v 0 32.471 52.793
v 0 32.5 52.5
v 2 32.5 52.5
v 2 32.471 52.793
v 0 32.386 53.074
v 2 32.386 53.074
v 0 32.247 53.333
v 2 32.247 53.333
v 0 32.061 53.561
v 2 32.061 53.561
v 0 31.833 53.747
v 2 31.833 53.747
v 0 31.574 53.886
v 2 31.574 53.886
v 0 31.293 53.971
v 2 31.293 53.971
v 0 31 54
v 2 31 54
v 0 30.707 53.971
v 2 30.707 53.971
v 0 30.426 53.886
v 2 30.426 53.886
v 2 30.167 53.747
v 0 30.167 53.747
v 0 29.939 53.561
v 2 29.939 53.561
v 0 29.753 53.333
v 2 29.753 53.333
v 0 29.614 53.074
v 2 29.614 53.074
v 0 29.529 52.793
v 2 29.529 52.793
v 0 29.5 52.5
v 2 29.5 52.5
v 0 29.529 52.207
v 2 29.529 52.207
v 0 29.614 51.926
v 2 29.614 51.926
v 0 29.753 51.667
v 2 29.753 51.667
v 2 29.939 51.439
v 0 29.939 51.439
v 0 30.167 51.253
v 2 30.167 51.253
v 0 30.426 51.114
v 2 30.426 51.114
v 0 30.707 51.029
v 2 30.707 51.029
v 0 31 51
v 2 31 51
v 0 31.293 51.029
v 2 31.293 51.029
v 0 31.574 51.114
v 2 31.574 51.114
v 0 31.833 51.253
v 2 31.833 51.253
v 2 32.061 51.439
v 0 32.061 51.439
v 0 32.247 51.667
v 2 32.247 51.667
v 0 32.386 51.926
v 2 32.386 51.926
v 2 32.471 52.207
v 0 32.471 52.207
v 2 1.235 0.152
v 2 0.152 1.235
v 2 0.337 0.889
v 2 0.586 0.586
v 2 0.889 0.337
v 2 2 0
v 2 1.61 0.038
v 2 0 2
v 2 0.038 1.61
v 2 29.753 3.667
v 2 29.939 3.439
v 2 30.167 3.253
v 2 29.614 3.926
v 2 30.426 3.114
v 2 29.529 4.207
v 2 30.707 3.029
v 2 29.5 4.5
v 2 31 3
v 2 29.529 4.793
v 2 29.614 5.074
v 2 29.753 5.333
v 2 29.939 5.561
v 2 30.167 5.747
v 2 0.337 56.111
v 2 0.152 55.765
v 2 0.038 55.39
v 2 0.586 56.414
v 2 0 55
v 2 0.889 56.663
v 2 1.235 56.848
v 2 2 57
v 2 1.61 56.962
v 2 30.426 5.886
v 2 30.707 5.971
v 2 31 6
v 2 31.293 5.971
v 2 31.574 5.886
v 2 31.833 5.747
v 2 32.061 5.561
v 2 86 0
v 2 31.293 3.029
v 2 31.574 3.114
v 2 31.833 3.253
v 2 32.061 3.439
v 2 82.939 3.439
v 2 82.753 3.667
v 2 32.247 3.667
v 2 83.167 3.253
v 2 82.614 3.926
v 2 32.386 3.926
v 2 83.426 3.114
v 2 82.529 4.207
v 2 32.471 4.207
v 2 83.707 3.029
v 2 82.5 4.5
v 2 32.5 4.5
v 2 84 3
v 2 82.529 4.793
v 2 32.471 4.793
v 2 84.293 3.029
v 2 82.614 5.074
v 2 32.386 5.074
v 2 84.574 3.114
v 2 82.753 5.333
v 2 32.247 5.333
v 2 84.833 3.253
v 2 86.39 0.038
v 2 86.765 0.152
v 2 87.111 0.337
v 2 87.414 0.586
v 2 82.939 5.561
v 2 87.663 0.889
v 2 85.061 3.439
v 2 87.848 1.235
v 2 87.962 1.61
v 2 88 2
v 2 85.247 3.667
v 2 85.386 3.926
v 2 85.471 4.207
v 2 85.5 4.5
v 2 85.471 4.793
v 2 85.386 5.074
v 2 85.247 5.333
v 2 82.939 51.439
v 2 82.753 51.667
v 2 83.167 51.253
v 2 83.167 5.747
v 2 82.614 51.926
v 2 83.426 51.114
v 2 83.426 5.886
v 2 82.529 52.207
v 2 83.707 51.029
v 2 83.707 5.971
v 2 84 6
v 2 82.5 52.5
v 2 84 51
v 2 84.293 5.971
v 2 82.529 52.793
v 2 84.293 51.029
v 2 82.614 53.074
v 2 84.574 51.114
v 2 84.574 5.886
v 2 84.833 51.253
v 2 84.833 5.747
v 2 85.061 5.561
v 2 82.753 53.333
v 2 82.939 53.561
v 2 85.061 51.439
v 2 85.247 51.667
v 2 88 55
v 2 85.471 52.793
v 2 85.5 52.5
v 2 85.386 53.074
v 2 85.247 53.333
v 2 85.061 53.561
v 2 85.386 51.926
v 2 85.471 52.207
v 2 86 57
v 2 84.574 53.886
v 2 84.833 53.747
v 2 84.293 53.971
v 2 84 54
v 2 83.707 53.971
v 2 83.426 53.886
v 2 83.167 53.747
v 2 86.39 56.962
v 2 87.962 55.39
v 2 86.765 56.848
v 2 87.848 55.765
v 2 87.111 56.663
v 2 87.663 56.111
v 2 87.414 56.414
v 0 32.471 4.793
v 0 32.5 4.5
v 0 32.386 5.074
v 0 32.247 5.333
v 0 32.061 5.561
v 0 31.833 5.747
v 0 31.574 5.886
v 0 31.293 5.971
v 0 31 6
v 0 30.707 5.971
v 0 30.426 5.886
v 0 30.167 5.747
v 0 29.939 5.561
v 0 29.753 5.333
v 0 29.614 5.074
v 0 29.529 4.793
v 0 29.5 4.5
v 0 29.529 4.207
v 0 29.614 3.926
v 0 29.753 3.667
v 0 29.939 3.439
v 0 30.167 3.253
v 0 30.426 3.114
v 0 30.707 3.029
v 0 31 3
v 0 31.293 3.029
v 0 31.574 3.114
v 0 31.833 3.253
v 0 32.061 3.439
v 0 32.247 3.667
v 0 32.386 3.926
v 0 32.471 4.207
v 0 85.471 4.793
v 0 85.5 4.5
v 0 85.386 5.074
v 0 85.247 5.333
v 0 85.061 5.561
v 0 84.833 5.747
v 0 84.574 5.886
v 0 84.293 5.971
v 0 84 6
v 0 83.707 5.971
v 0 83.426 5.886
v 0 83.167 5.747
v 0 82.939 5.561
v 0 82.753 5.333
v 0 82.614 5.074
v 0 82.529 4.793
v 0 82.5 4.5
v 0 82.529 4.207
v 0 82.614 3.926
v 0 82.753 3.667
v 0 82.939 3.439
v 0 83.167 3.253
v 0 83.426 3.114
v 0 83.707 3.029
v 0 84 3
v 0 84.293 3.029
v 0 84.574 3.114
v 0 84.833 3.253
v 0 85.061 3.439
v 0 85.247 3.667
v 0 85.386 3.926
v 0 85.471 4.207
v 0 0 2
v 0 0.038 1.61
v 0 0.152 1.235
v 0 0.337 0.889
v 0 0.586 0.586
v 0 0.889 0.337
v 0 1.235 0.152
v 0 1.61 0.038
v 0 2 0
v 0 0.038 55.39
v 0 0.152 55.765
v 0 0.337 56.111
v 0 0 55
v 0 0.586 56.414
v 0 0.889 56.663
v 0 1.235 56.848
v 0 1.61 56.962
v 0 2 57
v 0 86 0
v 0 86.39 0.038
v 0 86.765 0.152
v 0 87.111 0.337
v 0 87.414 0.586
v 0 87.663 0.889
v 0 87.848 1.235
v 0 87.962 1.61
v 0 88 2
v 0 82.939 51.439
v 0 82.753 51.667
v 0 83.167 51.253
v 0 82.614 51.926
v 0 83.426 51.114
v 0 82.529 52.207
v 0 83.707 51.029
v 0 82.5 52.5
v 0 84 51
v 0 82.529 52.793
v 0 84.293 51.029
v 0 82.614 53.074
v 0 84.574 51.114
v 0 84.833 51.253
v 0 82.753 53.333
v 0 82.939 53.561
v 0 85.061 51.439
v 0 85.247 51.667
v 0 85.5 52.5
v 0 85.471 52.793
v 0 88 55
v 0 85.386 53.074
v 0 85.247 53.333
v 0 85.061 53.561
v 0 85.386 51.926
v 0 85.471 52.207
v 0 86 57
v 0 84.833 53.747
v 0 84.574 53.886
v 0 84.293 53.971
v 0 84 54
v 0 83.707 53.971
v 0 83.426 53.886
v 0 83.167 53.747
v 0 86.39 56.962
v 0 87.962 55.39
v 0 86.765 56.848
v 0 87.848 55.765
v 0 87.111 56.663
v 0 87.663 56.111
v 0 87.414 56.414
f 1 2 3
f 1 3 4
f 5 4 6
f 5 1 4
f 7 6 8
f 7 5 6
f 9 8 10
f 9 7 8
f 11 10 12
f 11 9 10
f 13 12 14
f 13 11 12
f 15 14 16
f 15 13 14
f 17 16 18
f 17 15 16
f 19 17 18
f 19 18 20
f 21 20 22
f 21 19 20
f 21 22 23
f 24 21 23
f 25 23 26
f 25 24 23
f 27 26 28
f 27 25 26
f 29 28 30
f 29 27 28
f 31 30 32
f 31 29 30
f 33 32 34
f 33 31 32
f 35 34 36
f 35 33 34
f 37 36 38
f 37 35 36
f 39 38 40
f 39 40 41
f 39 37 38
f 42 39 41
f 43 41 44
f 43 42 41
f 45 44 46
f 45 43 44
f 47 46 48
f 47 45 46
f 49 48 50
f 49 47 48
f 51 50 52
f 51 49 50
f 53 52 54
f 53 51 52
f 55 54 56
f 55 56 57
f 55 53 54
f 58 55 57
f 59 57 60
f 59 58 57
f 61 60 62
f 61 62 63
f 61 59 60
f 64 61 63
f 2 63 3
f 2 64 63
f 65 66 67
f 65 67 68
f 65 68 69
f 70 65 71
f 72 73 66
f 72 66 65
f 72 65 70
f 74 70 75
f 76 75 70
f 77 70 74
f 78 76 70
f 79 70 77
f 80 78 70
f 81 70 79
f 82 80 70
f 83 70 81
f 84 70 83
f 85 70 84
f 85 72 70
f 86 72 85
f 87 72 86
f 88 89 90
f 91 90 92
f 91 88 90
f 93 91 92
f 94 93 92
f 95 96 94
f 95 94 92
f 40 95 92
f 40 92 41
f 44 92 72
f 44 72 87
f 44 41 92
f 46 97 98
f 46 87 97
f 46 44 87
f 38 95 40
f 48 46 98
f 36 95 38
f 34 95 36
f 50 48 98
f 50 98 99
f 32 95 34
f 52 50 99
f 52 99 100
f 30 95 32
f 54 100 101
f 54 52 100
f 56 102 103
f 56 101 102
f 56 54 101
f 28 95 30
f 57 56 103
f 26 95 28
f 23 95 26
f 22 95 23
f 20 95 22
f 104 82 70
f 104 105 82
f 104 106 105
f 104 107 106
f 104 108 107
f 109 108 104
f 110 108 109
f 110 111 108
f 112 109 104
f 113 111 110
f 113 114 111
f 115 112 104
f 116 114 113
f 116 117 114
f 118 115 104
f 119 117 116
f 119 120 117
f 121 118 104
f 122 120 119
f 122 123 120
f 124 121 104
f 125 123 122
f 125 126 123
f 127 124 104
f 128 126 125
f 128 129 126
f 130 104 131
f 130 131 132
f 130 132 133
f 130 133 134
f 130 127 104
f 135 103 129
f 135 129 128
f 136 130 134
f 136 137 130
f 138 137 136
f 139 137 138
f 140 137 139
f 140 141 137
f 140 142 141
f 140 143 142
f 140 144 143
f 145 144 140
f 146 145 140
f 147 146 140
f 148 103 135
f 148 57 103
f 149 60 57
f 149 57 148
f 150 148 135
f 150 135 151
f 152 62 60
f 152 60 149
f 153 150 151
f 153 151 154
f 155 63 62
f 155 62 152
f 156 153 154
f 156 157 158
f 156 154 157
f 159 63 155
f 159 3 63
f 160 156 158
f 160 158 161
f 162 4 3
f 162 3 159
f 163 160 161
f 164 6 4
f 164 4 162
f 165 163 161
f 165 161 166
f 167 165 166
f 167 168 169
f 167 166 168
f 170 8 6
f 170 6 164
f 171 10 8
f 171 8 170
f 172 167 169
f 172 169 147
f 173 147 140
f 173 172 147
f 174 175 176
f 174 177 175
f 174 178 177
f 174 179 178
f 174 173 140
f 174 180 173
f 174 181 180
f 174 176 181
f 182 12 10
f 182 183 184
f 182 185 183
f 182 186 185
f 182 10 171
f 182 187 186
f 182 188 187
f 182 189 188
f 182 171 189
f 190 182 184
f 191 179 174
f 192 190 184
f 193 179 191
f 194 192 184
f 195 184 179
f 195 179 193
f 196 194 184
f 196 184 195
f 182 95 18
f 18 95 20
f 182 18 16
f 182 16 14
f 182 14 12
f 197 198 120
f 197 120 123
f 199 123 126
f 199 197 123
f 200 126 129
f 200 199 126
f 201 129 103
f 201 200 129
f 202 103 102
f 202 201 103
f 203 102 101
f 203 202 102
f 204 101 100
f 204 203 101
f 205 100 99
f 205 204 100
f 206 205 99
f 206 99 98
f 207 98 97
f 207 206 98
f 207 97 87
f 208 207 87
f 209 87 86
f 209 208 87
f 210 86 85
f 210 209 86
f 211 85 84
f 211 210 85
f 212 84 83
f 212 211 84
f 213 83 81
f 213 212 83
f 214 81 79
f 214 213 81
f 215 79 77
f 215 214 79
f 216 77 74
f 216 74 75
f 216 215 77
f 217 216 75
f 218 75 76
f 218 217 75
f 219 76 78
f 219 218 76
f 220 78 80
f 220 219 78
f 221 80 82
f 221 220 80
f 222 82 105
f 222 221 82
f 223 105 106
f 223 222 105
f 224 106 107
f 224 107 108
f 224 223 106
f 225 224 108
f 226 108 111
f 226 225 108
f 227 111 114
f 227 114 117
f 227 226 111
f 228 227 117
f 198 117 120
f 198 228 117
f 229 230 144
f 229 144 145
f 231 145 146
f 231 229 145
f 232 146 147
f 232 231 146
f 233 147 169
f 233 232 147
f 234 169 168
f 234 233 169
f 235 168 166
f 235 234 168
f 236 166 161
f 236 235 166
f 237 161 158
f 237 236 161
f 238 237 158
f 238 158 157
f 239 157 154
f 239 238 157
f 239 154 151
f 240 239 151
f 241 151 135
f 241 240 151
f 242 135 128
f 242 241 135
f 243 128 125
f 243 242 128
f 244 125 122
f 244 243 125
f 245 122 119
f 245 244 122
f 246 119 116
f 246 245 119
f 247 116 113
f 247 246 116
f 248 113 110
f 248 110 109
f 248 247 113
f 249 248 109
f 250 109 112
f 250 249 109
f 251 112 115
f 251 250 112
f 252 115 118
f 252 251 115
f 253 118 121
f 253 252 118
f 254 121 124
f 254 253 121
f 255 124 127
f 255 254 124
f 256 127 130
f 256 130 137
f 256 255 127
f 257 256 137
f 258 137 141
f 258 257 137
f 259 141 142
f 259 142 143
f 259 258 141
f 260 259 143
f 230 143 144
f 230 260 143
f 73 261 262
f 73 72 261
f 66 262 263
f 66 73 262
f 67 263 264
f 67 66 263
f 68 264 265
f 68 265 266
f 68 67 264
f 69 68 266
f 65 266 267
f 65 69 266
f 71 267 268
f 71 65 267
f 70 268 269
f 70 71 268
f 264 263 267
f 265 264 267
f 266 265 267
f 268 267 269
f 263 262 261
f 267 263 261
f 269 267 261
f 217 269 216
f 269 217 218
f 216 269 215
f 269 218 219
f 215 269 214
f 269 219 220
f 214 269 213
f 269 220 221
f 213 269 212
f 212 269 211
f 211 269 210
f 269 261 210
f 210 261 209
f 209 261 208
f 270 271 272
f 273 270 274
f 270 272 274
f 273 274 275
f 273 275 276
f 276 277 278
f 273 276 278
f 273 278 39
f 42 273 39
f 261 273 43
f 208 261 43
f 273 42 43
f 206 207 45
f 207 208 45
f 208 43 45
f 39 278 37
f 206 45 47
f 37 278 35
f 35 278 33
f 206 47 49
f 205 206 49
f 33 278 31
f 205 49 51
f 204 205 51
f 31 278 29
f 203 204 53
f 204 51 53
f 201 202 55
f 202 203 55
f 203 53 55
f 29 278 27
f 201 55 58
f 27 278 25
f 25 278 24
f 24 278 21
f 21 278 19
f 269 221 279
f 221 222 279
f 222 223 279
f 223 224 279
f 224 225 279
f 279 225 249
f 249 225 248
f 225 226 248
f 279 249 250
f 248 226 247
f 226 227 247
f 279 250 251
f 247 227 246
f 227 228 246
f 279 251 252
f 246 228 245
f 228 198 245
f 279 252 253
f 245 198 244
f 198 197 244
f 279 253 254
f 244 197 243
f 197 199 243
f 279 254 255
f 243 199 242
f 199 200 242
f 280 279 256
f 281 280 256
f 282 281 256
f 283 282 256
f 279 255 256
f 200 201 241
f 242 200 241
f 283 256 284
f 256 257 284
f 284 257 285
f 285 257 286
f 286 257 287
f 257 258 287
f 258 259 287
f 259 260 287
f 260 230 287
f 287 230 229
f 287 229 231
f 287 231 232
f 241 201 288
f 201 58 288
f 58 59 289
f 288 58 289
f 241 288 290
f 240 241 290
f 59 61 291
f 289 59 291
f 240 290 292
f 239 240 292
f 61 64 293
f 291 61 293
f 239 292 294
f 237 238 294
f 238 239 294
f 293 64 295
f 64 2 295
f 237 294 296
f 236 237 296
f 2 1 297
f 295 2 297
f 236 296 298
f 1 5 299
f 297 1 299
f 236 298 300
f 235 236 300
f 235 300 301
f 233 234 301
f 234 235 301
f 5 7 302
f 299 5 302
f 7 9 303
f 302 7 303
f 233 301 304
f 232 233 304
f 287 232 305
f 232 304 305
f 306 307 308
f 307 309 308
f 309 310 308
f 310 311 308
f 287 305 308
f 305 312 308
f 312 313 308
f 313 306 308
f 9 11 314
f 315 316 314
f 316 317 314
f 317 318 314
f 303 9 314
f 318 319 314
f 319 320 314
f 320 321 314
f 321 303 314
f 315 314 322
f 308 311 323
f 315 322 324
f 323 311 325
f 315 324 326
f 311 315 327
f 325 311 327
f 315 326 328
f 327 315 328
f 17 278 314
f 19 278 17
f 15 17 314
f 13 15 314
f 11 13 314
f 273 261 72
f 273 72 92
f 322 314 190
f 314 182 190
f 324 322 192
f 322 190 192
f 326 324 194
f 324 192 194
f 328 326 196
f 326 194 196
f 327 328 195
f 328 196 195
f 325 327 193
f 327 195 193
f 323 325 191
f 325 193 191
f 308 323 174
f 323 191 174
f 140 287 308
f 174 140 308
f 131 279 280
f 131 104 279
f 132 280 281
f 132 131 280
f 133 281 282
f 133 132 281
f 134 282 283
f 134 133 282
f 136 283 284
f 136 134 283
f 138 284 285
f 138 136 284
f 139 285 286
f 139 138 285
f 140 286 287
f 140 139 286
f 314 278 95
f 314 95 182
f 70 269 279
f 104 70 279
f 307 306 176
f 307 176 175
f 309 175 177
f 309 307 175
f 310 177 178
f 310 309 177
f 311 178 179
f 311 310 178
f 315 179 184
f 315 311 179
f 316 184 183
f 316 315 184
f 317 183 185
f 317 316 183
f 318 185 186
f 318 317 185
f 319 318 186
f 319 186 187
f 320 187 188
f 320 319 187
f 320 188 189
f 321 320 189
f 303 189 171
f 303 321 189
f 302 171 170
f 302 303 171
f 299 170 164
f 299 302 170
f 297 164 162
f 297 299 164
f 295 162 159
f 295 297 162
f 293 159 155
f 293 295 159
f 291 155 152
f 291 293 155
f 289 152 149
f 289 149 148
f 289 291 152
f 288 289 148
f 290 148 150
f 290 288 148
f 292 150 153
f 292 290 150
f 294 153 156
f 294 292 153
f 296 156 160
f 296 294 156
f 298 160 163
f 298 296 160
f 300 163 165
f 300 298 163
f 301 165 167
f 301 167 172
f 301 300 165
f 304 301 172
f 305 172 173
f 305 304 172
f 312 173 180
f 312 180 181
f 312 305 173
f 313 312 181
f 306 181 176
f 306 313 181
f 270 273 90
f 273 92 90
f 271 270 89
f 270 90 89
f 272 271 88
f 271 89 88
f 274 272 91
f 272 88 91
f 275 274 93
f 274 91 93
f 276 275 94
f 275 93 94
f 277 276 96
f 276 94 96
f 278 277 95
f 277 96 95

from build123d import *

# Parameters (mm, degrees)
F0_W     = 88
F0_H     = 57
F0_R     = 1.5
F1_DEPTH = 2
F2_R     = 2


with BuildPart() as f1:
    # F0 (on Right) → F1 (new body)
    with BuildSketch(Plane.YZ):
        with Locations((44, 28.5)):
            Rectangle(F0_W, F0_H)
        with Locations((31, 4.5)):
            Circle(F0_R, mode=Mode.SUBTRACT)
        with Locations((84, 4.5)):
            Circle(F0_R, mode=Mode.SUBTRACT)
        with Locations((31, 52.5)):
            Circle(F0_R, mode=Mode.SUBTRACT)
        with Locations((84, 52.5)):
            Circle(F0_R, mode=Mode.SUBTRACT)
    extrude(amount=F1_DEPTH)

    # F2
    f2_edges = [f1.edges().sort_by_distance(p)[0] for p in [
        (1, 0, 0),
        (1, 88, 0),
        (1, 0, 57),
        (1, 88, 57),
    ]]
    fillet(f2_edges, radius=F2_R)


solid = f1.part
